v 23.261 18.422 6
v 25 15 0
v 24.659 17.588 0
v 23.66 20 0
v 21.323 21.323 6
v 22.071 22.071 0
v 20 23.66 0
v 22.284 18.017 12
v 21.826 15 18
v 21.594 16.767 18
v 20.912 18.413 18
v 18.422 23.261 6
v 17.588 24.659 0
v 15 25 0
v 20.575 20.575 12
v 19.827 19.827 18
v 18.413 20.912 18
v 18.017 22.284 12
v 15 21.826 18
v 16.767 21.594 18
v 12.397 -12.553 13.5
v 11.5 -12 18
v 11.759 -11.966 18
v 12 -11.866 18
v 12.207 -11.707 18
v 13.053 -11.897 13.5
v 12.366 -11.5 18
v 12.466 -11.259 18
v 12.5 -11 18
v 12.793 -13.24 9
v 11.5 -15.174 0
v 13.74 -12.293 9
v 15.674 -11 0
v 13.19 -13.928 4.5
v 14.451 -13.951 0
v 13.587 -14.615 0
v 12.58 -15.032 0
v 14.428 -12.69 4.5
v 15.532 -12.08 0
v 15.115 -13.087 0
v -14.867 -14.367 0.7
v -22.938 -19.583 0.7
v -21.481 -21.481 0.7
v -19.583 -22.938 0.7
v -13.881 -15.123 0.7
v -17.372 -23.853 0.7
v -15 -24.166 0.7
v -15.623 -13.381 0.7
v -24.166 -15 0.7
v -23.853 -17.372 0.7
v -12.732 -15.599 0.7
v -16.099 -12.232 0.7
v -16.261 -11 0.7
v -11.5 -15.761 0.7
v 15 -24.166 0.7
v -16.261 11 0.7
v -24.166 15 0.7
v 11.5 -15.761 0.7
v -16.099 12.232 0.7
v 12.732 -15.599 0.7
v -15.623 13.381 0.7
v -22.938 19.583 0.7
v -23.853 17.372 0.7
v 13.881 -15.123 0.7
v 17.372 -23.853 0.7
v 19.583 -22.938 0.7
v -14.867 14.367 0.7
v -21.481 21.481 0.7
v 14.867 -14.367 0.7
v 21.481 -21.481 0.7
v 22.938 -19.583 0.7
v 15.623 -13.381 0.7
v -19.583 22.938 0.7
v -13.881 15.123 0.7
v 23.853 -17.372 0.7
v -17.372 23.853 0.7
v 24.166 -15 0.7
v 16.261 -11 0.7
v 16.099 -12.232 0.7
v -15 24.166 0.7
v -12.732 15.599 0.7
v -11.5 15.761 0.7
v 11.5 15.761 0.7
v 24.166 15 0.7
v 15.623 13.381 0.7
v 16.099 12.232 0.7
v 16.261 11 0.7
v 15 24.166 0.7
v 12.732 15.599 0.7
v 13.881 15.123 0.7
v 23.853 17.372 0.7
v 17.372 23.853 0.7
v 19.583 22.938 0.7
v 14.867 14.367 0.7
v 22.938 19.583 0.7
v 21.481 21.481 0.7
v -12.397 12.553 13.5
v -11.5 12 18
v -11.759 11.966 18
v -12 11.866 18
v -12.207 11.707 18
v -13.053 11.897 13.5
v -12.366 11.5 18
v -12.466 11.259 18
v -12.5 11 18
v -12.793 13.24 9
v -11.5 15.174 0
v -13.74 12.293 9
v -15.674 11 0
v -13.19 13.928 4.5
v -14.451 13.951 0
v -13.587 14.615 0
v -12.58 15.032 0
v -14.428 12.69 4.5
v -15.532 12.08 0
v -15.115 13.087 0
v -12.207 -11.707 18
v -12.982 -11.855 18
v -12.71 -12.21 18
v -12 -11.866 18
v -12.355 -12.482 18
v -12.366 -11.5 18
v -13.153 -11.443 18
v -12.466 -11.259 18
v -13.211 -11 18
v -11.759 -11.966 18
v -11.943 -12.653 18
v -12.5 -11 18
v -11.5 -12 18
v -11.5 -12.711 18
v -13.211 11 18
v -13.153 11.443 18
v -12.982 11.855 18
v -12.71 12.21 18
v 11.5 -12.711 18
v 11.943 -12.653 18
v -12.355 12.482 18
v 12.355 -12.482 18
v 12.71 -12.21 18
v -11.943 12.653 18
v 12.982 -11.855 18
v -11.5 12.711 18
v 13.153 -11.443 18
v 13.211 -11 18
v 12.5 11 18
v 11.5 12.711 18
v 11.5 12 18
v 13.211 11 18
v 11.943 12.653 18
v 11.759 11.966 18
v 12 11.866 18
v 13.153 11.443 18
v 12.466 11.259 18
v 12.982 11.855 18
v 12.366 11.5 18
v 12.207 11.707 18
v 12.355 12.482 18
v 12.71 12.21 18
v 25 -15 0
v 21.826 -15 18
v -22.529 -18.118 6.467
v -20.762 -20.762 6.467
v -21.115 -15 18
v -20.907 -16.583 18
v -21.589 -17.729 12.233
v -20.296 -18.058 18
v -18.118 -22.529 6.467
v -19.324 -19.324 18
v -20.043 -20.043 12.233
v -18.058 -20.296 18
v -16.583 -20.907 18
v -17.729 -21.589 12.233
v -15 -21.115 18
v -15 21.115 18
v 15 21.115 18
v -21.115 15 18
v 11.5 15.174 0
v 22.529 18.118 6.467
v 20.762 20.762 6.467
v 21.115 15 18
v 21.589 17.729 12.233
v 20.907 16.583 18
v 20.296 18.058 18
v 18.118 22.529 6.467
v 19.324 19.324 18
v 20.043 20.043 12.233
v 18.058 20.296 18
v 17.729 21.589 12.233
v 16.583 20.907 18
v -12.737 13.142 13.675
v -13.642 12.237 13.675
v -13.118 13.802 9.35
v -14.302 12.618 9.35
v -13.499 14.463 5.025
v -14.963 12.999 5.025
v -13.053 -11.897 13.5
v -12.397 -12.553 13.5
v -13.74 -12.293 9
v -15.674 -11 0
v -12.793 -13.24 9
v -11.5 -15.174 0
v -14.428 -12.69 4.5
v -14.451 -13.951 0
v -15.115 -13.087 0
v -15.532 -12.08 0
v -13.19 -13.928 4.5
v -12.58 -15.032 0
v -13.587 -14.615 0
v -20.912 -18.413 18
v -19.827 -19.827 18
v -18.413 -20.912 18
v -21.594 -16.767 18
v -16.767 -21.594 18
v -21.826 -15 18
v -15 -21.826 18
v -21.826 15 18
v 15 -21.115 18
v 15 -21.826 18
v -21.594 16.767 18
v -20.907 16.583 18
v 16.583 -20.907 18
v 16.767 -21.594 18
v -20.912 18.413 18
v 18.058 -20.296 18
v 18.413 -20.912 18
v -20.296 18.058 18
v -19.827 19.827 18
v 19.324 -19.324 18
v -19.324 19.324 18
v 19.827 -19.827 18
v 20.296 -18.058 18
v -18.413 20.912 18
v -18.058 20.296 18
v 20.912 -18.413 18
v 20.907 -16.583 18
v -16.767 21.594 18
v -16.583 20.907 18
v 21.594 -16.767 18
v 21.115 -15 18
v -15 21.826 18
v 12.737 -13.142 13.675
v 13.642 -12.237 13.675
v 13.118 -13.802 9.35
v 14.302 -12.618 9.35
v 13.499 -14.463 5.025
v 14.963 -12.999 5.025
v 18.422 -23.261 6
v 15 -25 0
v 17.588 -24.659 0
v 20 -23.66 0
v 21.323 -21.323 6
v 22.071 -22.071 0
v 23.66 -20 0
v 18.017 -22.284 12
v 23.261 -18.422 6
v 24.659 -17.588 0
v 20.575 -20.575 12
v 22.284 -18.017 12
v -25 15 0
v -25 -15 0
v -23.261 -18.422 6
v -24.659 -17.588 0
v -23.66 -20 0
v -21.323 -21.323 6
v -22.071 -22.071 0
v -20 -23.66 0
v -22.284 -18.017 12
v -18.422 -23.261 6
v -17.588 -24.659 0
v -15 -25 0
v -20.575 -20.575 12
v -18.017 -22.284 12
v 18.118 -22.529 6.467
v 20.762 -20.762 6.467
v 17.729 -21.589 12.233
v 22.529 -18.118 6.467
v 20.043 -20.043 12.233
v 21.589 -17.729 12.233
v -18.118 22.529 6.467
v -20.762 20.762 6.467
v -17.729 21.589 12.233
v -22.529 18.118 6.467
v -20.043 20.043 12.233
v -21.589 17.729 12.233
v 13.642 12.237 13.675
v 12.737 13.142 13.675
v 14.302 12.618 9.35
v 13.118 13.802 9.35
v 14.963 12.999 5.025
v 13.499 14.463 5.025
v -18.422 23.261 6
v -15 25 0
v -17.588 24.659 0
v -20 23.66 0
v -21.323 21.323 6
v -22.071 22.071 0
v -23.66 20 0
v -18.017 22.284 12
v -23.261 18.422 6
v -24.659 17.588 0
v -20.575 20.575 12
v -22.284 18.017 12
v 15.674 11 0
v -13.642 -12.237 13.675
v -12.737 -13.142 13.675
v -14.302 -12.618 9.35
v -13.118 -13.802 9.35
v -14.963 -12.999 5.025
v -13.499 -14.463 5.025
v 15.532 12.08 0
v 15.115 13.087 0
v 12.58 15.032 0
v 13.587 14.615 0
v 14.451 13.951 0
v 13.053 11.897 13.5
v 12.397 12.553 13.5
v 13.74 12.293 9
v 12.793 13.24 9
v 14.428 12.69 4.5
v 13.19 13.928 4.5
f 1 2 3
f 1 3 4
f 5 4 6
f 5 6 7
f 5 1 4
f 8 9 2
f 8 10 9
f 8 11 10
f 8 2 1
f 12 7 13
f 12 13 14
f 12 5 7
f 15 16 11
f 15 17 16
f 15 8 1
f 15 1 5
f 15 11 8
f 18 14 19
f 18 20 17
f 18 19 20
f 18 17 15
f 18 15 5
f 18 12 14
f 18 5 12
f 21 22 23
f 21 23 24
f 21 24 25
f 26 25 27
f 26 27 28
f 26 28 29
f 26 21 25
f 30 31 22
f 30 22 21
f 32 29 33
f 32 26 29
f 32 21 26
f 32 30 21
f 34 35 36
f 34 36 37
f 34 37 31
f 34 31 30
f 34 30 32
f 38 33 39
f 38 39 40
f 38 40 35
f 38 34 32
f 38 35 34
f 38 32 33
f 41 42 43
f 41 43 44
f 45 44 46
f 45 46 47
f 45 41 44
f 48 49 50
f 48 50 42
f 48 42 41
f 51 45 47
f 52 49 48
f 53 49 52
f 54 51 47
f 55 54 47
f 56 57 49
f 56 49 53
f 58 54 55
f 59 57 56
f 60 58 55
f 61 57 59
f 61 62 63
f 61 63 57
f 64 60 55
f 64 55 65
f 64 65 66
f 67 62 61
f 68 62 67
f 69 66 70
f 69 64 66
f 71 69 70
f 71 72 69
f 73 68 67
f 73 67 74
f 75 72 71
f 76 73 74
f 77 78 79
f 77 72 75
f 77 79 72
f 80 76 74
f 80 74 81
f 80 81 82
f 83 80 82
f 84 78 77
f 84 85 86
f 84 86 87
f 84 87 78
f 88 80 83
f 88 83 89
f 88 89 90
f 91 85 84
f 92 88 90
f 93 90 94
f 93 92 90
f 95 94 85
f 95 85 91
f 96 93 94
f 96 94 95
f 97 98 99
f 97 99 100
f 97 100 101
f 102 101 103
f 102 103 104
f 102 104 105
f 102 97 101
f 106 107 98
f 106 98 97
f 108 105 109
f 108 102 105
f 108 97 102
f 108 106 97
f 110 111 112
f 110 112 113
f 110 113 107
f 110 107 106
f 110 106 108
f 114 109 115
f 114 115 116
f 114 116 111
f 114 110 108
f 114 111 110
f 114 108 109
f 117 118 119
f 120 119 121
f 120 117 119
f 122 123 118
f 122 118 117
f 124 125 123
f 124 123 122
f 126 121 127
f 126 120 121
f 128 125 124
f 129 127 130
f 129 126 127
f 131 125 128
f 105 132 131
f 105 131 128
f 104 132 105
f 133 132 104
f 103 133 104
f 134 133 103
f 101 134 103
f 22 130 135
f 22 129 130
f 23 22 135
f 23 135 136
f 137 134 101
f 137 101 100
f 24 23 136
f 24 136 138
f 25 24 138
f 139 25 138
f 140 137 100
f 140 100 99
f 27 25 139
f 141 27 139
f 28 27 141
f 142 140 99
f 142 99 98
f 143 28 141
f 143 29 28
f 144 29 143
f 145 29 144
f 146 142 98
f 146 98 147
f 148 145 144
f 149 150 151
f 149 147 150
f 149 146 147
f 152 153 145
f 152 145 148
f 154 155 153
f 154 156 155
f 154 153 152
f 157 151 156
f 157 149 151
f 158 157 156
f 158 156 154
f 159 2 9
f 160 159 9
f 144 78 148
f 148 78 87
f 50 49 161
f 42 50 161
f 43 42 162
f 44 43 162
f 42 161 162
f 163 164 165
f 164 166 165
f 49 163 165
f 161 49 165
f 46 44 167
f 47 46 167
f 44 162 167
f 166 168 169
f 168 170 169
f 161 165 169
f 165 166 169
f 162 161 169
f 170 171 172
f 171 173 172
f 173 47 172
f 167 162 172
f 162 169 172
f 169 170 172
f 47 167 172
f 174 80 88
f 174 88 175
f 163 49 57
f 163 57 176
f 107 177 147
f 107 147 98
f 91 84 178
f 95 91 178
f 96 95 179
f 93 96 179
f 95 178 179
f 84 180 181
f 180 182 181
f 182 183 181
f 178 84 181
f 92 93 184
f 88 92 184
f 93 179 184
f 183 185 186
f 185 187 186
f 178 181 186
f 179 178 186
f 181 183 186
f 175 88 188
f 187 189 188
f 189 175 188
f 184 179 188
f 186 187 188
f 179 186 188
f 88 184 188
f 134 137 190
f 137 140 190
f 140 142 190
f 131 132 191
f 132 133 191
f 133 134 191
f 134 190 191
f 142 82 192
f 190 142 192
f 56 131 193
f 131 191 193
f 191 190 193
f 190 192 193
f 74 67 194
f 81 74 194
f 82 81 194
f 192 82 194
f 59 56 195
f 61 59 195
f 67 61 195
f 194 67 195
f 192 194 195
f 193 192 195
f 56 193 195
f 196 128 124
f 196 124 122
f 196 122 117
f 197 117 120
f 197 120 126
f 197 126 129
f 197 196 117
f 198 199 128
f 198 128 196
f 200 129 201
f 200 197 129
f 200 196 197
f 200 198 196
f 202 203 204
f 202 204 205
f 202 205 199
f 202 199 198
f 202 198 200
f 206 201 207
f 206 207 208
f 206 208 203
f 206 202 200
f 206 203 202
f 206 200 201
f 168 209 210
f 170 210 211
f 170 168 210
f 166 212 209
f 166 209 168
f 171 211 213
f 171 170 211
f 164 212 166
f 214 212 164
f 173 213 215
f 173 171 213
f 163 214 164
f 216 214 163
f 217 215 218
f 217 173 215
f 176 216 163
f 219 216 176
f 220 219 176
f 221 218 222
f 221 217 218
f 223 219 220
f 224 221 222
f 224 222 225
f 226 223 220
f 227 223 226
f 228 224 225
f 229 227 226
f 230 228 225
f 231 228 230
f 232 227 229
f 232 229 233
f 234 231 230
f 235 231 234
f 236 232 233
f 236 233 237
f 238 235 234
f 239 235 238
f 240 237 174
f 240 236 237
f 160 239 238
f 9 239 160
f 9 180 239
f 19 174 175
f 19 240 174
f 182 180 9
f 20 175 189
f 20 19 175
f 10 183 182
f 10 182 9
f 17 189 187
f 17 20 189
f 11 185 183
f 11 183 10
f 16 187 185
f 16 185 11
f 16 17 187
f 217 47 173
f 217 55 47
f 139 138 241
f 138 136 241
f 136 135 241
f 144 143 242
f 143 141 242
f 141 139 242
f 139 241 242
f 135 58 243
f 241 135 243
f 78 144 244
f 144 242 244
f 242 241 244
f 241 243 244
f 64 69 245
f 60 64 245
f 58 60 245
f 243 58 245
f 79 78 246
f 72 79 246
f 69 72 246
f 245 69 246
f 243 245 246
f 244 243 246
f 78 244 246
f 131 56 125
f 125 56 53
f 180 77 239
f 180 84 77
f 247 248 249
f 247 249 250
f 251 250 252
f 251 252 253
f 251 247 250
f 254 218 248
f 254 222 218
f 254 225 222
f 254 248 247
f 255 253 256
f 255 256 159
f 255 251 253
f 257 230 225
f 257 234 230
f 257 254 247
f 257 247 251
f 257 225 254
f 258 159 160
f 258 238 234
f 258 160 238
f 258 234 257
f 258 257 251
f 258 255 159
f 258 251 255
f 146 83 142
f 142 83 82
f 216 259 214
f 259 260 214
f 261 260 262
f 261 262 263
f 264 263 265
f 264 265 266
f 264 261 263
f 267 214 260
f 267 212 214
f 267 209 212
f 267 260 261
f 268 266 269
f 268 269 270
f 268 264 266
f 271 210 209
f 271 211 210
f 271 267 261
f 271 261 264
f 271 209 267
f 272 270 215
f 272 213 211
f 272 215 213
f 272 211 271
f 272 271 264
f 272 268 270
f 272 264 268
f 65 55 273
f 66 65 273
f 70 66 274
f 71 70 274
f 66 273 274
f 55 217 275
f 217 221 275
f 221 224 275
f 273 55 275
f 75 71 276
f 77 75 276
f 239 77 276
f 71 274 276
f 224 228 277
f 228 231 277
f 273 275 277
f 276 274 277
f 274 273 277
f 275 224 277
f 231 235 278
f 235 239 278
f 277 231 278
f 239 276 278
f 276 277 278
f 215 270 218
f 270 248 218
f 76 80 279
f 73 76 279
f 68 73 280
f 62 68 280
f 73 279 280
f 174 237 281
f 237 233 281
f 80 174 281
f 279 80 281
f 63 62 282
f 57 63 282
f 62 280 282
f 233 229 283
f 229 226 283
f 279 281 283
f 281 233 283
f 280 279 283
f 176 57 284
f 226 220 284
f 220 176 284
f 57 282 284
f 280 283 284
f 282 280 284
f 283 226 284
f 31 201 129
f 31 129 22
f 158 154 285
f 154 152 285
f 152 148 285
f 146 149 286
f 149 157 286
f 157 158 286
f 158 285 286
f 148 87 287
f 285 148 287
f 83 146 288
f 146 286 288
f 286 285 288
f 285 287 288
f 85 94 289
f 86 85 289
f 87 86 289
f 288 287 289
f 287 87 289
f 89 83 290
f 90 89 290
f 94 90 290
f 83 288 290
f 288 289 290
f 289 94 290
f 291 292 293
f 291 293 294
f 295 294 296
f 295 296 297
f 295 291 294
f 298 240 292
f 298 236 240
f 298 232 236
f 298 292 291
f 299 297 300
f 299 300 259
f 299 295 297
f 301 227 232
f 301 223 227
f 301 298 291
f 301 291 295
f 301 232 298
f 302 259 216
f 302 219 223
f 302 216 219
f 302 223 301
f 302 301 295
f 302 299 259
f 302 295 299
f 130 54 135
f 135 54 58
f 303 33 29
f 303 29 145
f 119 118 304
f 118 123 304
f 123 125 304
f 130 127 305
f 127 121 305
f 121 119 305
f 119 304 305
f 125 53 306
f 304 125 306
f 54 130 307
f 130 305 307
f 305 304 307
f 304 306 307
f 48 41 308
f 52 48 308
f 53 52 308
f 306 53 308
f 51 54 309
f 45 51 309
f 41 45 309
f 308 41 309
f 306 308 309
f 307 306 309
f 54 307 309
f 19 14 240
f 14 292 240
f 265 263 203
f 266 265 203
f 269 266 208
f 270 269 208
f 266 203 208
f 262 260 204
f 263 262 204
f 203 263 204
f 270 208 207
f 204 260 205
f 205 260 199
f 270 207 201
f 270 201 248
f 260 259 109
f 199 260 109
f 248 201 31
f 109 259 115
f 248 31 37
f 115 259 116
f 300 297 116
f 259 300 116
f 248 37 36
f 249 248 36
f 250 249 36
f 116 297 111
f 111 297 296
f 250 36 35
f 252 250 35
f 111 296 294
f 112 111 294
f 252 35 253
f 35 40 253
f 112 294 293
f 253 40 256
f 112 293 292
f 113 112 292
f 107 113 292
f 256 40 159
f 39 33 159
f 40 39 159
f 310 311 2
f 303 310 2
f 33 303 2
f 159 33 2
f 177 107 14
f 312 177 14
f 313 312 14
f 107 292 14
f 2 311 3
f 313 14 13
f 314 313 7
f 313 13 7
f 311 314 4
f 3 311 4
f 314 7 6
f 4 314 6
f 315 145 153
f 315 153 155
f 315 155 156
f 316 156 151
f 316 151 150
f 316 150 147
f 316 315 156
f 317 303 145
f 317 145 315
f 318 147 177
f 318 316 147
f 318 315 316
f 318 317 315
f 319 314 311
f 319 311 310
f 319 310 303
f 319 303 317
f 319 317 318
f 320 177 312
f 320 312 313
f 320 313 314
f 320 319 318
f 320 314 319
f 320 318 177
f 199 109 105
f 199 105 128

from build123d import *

# Parameters (mm, degrees)
F1_DEPTH = 18
F1_TAPER = 10
F3_DEPTH = 18.001
F3_TAPER = -10
F4_T     = -0.7


with BuildPart() as f1:
    # F0 (on Top) → F1 (new body)
    with BuildSketch(Plane.XY):
        with BuildLine():
            ThreePointArc((25, 15), (22.0710678119, 22.0710678119), (15, 25))
            Line((15, 25), (-15, 25))
            ThreePointArc((-15, 25), (-22.0710678119, 22.0710678119), (-25, 15))
            Line((-25, 15), (-25, -15))
            ThreePointArc((-25, -15), (-22.0710678119, -22.0710678119), (-15, -25))
            Line((-15, -25), (15, -25))
            ThreePointArc((15, -25), (22.0710678119, -22.0710678119), (25, -15))
            Line((25, -15), (25, 15))
        make_face()
    extrude(amount=F1_DEPTH, taper=F1_TAPER)

    # F2 (on face) → F3 (cut, through all)
    with BuildSketch(Plane.XY.offset(18)):
        with BuildLine():
            ThreePointArc((12.5, 11), (12.2071067812, 11.7071067812), (11.5, 12))
            Line((11.5, 12), (-11.5, 12))
            ThreePointArc((-11.5, 12), (-12.2071067812, 11.7071067812), (-12.5, 11))
            Line((-12.5, 11), (-12.5, -11))
            ThreePointArc((-12.5, -11), (-12.2071067812, -11.7071067812), (-11.5, -12))
            Line((-11.5, -12), (11.5, -12))
            ThreePointArc((11.5, -12), (12.2071067812, -11.7071067812), (12.5, -11))
            Line((12.5, -11), (12.5, 11))
        make_face()
    extrude(amount=-F3_DEPTH, taper=F3_TAPER, mode=Mode.SUBTRACT)

    # F4
    f4_openings = [f1.faces().sort_by_distance(p)[0] for p in [
        (21.208779, 0, 18),
    ]]
    offset(amount=F4_T, openings=f4_openings)


solid = f1.part
